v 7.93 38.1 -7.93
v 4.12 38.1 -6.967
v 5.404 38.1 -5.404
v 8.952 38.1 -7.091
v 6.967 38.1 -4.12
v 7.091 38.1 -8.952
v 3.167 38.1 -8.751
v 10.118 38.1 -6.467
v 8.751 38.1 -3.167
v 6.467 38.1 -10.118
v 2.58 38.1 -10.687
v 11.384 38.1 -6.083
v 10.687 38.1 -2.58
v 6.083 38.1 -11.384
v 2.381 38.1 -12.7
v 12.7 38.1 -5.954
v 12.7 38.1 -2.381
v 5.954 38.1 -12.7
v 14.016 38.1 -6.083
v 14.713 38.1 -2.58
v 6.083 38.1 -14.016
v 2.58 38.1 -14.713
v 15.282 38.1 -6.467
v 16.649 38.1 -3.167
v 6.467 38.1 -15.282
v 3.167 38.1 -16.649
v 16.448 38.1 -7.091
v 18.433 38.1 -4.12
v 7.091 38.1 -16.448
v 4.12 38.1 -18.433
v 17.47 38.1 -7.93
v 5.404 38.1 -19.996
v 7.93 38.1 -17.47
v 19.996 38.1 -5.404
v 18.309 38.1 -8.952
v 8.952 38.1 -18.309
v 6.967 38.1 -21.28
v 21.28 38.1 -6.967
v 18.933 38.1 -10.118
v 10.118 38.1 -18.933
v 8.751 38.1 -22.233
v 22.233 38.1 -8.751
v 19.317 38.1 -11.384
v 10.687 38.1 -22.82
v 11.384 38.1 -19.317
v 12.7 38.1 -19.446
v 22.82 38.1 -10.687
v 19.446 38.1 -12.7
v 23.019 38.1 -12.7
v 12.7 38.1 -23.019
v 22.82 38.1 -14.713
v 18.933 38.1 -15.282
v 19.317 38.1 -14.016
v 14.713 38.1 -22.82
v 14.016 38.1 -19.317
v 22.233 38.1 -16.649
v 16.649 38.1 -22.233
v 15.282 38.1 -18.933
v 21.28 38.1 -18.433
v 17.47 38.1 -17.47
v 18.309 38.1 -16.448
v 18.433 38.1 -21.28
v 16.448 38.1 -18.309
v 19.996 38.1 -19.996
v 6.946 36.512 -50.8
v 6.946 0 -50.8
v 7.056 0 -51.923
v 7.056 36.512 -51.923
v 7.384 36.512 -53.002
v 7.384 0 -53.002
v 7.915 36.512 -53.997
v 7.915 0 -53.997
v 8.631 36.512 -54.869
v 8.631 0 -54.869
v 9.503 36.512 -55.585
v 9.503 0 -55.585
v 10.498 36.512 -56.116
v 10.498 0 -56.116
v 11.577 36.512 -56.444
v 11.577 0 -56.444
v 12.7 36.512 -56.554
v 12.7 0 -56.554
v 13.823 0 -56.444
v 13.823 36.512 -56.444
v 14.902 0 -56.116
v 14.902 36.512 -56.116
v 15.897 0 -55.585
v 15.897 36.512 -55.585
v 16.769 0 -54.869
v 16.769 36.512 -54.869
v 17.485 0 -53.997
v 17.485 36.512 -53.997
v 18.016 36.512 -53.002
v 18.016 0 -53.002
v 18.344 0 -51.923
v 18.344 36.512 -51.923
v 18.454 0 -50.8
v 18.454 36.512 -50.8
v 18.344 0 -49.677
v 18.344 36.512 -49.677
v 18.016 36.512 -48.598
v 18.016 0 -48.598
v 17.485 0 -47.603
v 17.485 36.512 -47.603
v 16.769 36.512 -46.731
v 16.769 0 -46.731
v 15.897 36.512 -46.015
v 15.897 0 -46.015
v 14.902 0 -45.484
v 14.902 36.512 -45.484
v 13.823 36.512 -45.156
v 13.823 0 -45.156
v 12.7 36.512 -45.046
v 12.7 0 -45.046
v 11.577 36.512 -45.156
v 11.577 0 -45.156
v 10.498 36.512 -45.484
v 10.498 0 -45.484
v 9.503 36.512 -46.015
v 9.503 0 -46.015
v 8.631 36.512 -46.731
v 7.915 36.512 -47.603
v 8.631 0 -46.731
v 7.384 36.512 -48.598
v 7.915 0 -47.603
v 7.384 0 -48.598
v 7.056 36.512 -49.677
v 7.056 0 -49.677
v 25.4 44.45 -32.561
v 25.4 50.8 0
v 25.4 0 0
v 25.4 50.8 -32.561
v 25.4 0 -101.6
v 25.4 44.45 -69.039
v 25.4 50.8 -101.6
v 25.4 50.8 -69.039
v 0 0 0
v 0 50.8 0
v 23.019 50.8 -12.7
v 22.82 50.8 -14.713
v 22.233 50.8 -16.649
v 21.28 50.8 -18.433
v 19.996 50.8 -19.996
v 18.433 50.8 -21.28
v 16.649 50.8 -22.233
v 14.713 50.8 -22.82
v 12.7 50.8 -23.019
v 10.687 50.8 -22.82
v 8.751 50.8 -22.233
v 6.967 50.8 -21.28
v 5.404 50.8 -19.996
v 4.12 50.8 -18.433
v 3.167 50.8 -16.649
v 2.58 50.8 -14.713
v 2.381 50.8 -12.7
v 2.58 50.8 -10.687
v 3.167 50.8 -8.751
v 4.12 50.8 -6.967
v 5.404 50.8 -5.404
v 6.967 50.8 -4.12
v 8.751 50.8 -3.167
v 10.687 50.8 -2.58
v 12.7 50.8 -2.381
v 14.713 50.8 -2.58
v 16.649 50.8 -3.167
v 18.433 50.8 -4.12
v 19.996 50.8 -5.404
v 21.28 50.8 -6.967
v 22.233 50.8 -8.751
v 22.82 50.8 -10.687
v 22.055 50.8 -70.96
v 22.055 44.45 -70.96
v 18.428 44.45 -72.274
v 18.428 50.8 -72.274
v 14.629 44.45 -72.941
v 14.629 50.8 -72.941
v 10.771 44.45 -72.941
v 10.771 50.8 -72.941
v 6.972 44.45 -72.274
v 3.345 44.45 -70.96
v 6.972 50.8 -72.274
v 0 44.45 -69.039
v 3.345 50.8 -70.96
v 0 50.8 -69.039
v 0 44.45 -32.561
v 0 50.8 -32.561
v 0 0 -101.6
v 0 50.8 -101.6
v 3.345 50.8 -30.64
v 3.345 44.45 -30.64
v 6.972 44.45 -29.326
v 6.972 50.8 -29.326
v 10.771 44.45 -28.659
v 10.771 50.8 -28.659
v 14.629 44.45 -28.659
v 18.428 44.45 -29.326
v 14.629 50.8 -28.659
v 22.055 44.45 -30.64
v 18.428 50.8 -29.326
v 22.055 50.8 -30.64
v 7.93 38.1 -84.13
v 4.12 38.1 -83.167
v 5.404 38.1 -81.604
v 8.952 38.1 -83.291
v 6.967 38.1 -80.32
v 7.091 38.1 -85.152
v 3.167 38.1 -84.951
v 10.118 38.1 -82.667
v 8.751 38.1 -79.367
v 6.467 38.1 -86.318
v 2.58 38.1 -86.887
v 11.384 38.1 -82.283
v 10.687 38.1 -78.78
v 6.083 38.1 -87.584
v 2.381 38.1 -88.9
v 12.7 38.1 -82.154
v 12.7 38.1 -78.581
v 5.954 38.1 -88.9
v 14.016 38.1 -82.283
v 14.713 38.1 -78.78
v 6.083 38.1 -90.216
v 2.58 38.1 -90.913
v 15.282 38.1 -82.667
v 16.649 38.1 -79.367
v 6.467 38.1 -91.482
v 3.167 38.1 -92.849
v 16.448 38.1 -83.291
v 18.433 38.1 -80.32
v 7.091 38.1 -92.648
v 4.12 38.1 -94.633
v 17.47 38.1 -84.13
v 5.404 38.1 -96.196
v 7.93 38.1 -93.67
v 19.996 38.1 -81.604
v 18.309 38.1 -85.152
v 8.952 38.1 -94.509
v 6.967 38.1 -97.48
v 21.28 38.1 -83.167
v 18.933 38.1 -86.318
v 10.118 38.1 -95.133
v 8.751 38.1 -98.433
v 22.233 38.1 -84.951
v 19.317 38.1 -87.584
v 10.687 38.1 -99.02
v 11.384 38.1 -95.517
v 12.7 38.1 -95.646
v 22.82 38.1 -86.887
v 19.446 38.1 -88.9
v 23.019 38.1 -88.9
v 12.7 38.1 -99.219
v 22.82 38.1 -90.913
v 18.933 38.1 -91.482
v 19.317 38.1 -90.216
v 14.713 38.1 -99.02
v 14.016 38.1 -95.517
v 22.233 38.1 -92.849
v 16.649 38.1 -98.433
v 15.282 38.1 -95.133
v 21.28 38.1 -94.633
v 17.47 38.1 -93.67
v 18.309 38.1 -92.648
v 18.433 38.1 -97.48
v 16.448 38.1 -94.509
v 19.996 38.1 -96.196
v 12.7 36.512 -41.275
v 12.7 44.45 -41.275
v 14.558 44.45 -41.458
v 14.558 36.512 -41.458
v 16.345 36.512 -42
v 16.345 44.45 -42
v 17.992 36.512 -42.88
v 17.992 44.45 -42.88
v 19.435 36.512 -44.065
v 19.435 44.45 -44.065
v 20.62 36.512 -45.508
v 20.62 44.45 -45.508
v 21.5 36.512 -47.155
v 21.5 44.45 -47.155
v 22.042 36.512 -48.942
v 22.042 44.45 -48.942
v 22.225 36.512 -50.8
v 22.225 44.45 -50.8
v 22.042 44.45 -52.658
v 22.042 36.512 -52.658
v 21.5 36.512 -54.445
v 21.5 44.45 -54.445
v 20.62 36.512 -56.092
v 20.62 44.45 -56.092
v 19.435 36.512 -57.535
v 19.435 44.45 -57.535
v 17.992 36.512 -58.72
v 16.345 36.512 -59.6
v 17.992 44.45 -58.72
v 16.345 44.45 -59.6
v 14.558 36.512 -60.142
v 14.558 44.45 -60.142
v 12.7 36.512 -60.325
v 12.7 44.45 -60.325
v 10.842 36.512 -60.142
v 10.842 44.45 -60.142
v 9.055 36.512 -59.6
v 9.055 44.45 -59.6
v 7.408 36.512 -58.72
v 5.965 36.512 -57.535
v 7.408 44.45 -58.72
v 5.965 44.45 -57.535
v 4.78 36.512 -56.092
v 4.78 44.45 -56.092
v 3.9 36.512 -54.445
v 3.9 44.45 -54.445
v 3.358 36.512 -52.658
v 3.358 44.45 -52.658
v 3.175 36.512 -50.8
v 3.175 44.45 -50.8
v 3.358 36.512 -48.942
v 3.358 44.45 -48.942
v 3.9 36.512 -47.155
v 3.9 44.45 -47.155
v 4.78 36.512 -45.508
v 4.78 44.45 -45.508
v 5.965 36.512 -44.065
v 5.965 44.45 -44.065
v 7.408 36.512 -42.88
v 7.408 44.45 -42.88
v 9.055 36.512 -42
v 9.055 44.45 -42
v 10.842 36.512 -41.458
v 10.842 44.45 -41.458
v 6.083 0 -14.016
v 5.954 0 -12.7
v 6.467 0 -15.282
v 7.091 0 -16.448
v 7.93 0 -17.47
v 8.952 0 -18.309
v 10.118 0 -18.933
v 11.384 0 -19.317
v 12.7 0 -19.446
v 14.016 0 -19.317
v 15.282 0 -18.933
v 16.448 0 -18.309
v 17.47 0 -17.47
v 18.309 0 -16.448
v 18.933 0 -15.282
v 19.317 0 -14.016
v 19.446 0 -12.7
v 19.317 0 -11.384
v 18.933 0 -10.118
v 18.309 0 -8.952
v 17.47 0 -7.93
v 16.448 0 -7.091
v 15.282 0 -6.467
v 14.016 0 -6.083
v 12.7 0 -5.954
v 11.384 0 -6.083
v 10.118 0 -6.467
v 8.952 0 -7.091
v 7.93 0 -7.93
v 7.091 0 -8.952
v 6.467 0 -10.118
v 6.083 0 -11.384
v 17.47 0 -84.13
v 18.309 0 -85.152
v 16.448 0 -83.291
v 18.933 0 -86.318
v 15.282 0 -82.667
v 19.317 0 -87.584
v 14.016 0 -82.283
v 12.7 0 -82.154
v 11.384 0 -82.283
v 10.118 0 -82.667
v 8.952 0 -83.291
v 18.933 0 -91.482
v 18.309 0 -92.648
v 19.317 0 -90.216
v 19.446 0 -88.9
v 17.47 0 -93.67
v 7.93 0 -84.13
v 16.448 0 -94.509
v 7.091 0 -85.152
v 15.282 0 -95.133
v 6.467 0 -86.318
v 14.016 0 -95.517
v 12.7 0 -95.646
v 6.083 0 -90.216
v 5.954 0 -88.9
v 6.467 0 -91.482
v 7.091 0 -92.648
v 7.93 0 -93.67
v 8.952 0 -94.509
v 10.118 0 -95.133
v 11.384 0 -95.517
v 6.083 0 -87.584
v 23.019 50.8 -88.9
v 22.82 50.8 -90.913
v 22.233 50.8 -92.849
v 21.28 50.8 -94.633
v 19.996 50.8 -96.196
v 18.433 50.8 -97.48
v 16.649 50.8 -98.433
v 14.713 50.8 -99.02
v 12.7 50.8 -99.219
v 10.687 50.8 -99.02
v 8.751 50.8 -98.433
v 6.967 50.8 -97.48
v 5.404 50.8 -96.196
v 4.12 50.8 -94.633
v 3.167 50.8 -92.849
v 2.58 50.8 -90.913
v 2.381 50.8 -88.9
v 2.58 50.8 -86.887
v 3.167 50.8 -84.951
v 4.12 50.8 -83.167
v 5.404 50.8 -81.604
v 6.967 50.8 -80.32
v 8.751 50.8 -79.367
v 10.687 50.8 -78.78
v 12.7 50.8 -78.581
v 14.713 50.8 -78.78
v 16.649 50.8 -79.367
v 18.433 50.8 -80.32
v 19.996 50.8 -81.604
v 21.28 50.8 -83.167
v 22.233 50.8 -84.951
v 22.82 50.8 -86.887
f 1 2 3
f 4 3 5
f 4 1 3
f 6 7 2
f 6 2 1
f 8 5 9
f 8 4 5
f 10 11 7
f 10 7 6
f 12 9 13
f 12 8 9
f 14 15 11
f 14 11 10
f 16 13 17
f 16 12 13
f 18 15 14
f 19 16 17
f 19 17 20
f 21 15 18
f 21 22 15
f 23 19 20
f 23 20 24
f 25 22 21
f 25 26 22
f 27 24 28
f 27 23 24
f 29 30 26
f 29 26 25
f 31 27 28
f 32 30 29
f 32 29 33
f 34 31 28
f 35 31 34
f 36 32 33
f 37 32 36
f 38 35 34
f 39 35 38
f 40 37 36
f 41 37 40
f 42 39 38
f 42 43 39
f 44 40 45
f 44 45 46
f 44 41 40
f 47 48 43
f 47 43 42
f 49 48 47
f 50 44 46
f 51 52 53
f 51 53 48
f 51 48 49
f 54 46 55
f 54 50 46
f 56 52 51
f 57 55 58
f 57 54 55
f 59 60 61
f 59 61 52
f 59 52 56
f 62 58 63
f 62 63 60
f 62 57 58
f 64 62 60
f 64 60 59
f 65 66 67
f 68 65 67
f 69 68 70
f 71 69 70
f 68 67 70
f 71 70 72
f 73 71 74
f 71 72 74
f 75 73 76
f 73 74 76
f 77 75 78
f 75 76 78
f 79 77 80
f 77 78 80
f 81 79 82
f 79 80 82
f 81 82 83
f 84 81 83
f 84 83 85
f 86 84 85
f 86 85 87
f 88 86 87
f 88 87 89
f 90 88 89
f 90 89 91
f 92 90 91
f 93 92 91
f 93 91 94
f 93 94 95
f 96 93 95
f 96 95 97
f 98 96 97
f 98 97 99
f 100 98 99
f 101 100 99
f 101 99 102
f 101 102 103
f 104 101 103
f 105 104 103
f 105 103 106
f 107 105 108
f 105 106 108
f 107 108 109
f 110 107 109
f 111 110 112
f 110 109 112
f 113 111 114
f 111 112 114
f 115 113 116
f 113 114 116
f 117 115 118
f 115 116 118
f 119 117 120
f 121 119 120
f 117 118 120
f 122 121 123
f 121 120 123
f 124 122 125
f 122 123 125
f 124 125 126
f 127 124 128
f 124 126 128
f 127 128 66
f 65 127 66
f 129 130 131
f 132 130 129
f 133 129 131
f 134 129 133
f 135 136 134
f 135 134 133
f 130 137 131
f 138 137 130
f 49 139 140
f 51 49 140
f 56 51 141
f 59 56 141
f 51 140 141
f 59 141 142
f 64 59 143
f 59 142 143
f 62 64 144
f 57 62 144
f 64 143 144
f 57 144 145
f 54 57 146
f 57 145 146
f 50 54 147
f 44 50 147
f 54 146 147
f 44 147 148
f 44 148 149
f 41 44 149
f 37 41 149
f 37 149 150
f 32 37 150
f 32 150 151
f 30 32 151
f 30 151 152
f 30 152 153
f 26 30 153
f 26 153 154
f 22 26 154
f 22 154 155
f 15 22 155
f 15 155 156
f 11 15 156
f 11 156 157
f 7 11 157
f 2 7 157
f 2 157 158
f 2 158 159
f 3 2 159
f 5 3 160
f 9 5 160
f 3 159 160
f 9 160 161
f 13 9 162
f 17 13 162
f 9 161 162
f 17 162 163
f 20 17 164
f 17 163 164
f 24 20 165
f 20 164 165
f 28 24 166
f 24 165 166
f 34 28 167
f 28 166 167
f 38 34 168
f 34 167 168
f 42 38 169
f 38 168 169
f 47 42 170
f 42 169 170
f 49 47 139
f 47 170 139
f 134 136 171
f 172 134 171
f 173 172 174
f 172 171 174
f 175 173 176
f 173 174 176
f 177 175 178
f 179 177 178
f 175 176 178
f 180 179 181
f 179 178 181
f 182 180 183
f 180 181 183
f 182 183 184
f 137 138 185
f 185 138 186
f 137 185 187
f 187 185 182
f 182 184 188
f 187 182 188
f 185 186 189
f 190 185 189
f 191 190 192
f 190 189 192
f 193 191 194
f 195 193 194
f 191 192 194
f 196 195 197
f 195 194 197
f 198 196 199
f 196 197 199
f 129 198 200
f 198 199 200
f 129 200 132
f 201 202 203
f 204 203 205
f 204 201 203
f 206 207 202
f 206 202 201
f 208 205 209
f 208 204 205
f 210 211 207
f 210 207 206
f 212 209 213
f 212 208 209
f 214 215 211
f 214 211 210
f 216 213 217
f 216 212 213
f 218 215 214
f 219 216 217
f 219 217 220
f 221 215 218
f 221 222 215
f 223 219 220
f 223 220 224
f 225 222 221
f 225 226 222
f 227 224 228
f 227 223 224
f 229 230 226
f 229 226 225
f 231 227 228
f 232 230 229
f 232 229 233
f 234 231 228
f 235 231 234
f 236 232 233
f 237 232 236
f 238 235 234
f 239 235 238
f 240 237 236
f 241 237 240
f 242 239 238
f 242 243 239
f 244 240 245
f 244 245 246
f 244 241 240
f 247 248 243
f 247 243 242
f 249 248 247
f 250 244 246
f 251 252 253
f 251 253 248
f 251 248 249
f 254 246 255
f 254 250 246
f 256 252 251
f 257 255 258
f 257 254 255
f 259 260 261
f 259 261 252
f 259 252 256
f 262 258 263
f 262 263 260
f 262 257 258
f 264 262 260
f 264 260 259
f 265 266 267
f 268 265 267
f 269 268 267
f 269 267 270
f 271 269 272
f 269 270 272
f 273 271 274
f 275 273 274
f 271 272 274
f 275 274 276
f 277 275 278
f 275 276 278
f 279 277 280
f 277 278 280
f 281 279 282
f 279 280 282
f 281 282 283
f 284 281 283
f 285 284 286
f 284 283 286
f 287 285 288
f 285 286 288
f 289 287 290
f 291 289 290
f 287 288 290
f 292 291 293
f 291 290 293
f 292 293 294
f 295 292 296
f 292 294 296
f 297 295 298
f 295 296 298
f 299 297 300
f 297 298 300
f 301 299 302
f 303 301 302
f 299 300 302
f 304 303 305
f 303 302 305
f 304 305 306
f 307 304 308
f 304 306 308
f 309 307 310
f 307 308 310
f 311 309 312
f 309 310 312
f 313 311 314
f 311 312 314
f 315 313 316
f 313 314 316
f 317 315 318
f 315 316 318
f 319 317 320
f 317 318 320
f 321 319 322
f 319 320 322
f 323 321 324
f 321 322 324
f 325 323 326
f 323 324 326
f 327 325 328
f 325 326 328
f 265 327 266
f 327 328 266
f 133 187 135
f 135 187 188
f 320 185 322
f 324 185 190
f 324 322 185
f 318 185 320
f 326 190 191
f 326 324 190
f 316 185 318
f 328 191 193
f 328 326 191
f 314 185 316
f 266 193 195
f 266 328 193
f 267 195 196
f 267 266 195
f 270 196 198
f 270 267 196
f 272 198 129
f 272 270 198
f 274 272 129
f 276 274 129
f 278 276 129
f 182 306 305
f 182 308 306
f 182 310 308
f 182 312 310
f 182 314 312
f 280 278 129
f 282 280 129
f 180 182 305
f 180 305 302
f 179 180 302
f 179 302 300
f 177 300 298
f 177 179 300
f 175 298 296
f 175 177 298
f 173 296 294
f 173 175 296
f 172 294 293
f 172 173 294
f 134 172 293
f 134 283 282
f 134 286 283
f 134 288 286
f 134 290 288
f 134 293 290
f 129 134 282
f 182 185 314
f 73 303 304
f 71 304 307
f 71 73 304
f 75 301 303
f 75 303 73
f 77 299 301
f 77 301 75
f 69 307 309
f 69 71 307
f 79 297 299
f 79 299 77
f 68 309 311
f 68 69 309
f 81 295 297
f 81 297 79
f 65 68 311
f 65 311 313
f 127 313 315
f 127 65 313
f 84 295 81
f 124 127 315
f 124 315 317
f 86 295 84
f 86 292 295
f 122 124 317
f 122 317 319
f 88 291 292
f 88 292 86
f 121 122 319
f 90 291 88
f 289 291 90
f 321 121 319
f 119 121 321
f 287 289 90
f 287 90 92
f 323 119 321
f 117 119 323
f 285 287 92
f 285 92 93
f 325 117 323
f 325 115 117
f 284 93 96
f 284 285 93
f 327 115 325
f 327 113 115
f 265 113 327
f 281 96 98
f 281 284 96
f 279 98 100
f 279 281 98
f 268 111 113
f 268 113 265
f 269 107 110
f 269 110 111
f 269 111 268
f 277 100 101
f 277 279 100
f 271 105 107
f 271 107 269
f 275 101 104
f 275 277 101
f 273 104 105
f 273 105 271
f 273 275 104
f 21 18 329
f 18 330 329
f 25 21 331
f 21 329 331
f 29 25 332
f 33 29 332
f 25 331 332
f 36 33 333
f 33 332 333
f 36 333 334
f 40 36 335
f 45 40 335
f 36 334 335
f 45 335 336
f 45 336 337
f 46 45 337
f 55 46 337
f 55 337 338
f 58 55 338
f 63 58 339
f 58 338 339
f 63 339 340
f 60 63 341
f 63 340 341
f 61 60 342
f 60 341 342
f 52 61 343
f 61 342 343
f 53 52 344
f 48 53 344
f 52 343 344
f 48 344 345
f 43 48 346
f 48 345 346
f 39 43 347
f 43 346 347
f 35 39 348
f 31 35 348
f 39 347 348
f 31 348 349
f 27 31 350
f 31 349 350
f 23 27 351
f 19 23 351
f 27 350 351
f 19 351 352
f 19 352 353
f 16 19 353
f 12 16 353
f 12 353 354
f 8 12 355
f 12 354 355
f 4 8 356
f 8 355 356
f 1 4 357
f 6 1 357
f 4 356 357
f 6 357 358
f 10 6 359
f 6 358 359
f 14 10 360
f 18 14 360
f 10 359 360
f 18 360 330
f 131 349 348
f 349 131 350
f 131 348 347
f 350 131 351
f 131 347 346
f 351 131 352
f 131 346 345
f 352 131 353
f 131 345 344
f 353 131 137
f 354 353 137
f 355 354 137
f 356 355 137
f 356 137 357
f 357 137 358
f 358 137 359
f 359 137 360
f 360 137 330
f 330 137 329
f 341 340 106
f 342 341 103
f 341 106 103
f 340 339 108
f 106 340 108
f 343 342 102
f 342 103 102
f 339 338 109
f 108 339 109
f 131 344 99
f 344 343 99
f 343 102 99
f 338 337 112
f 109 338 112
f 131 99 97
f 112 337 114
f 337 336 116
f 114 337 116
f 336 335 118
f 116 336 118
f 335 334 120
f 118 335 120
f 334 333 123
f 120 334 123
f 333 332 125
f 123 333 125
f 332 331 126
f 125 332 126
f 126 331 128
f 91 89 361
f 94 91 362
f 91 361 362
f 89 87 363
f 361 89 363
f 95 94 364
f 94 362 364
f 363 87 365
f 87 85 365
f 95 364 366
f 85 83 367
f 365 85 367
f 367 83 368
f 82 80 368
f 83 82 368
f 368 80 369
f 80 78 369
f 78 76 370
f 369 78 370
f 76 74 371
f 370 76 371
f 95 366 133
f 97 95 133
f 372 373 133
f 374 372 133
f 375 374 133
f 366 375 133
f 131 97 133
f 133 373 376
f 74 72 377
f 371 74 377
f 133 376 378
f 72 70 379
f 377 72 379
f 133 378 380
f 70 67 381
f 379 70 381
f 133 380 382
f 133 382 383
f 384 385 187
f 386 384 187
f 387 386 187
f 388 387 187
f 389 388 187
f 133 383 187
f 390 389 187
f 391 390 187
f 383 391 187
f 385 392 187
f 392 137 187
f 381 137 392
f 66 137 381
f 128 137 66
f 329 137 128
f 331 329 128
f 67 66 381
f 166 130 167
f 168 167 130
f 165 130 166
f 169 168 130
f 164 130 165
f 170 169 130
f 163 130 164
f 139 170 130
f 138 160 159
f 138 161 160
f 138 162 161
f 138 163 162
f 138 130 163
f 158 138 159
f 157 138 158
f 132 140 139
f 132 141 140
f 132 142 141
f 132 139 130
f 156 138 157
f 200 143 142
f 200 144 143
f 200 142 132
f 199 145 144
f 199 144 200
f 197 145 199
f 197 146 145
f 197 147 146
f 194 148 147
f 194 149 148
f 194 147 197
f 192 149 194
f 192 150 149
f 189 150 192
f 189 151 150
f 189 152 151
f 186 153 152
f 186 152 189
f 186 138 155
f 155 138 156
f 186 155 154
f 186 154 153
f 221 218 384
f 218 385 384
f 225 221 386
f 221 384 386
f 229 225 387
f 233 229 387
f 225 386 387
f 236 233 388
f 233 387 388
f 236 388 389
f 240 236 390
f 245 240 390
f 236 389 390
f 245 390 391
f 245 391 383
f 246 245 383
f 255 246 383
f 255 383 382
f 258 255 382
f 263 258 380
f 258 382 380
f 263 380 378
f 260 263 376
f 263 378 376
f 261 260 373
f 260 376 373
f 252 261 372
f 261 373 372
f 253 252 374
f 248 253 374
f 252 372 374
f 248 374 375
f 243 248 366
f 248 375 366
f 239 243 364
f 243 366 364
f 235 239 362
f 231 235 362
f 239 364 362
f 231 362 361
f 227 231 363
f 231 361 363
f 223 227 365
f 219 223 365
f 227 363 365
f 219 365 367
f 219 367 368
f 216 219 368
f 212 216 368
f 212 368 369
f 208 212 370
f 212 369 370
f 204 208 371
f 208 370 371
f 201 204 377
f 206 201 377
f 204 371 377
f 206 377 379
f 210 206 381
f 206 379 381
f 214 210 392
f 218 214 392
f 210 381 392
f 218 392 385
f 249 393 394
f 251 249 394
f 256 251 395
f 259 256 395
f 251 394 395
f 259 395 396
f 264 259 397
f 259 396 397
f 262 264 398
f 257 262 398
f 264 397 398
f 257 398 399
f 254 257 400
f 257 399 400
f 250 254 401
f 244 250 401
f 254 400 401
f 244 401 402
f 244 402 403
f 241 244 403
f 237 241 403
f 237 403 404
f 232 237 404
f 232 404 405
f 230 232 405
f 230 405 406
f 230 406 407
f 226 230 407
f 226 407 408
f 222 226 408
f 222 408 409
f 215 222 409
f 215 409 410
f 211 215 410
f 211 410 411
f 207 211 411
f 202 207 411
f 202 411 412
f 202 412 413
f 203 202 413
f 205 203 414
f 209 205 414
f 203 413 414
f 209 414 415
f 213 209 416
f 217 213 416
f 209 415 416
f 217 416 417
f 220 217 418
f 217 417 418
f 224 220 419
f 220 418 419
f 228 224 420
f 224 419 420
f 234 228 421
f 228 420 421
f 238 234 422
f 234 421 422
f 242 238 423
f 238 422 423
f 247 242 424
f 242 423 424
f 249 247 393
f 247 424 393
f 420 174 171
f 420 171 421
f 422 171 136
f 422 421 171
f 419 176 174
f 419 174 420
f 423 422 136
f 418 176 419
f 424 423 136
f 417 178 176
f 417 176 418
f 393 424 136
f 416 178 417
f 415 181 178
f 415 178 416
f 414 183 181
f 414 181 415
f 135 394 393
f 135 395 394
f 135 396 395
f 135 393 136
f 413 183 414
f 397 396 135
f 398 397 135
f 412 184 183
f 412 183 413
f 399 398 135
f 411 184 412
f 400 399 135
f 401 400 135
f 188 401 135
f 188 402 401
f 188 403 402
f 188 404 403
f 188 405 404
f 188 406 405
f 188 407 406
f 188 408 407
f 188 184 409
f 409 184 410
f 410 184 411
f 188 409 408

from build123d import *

# Parameters (mm, degrees)
SKETCH1_W                                        = 101.6
SKETCH1_H                                        = 50.8
BOSS_EXTRUDE1_DEPTH                              = 25.4
SKETCH2_R                                        = 22.225
CUT_EXTRUDE1_DEPTH                               = 6.35
SKETCH3_R                                        = 9.525
CUT_EXTRUDE2_DEPTH                               = 7.9375
F_1_2_20_TAPPED_HOLE1_D                          = 11.50874
CBORE_FOR_1_2_SOCKET_HEAD_CAP_SCREW1_D           = 13.49248
CBORE_FOR_1_2_SOCKET_HEAD_CAP_SCREW1_CBORE_D     = 20.6375
CBORE_FOR_1_2_SOCKET_HEAD_CAP_SCREW1_CBORE_DEPTH = 12.7


with BuildPart() as part:
    # Sketch1 → Boss-Extrude1 (new body)
    with BuildSketch(Plane(origin=(0, 0, 0), x_dir=(0, 0, -1), z_dir=(1, 0, 0))):
        with Locations((50.8, 25.4)):
            Rectangle(SKETCH1_W, SKETCH1_H)
    extrude(amount=BOSS_EXTRUDE1_DEPTH)

    # Sketch2 → Cut-Extrude1 (cut)
    with BuildSketch(Plane(origin=(0, 50.8, 0), x_dir=(1, 0, 0), z_dir=(0, 1, 0))):
        with Locations((12.7, 50.8)):
            Circle(SKETCH2_R)
    extrude(amount=-CUT_EXTRUDE1_DEPTH, mode=Mode.SUBTRACT)

    # Sketch3 → Cut-Extrude2 (cut)
    with BuildSketch(Plane(origin=(0, 44.45, 0), x_dir=(1, 0, 0), z_dir=(0, 1, 0))):
        with Locations(Location((12.7, 50.8, 0), (0, 0, 270))):
            Circle(SKETCH3_R)
    extrude(amount=-CUT_EXTRUDE2_DEPTH, mode=Mode.SUBTRACT)

    # 1/2-20 Tapped Hole1 (through all)
    with Locations(Plane(origin=(0, 36.5125, 0), x_dir=(1, 0, 0), z_dir=(0, 1, 0))):
        with Locations((12.7, 50.8)):
            Hole(F_1_2_20_TAPPED_HOLE1_D / 2)

    # CBORE for 1/2 Socket Head Cap Screw1 (through all)
    with Locations(Plane(origin=(0, 50.8, 0), x_dir=(1, 0, 0), z_dir=(0, 1, 0))):
        with Locations((12.7, 88.9), (12.7, 12.7)):
            CounterBoreHole(CBORE_FOR_1_2_SOCKET_HEAD_CAP_SCREW1_D / 2, CBORE_FOR_1_2_SOCKET_HEAD_CAP_SCREW1_CBORE_D / 2, CBORE_FOR_1_2_SOCKET_HEAD_CAP_SCREW1_CBORE_DEPTH)


solid = part.part
